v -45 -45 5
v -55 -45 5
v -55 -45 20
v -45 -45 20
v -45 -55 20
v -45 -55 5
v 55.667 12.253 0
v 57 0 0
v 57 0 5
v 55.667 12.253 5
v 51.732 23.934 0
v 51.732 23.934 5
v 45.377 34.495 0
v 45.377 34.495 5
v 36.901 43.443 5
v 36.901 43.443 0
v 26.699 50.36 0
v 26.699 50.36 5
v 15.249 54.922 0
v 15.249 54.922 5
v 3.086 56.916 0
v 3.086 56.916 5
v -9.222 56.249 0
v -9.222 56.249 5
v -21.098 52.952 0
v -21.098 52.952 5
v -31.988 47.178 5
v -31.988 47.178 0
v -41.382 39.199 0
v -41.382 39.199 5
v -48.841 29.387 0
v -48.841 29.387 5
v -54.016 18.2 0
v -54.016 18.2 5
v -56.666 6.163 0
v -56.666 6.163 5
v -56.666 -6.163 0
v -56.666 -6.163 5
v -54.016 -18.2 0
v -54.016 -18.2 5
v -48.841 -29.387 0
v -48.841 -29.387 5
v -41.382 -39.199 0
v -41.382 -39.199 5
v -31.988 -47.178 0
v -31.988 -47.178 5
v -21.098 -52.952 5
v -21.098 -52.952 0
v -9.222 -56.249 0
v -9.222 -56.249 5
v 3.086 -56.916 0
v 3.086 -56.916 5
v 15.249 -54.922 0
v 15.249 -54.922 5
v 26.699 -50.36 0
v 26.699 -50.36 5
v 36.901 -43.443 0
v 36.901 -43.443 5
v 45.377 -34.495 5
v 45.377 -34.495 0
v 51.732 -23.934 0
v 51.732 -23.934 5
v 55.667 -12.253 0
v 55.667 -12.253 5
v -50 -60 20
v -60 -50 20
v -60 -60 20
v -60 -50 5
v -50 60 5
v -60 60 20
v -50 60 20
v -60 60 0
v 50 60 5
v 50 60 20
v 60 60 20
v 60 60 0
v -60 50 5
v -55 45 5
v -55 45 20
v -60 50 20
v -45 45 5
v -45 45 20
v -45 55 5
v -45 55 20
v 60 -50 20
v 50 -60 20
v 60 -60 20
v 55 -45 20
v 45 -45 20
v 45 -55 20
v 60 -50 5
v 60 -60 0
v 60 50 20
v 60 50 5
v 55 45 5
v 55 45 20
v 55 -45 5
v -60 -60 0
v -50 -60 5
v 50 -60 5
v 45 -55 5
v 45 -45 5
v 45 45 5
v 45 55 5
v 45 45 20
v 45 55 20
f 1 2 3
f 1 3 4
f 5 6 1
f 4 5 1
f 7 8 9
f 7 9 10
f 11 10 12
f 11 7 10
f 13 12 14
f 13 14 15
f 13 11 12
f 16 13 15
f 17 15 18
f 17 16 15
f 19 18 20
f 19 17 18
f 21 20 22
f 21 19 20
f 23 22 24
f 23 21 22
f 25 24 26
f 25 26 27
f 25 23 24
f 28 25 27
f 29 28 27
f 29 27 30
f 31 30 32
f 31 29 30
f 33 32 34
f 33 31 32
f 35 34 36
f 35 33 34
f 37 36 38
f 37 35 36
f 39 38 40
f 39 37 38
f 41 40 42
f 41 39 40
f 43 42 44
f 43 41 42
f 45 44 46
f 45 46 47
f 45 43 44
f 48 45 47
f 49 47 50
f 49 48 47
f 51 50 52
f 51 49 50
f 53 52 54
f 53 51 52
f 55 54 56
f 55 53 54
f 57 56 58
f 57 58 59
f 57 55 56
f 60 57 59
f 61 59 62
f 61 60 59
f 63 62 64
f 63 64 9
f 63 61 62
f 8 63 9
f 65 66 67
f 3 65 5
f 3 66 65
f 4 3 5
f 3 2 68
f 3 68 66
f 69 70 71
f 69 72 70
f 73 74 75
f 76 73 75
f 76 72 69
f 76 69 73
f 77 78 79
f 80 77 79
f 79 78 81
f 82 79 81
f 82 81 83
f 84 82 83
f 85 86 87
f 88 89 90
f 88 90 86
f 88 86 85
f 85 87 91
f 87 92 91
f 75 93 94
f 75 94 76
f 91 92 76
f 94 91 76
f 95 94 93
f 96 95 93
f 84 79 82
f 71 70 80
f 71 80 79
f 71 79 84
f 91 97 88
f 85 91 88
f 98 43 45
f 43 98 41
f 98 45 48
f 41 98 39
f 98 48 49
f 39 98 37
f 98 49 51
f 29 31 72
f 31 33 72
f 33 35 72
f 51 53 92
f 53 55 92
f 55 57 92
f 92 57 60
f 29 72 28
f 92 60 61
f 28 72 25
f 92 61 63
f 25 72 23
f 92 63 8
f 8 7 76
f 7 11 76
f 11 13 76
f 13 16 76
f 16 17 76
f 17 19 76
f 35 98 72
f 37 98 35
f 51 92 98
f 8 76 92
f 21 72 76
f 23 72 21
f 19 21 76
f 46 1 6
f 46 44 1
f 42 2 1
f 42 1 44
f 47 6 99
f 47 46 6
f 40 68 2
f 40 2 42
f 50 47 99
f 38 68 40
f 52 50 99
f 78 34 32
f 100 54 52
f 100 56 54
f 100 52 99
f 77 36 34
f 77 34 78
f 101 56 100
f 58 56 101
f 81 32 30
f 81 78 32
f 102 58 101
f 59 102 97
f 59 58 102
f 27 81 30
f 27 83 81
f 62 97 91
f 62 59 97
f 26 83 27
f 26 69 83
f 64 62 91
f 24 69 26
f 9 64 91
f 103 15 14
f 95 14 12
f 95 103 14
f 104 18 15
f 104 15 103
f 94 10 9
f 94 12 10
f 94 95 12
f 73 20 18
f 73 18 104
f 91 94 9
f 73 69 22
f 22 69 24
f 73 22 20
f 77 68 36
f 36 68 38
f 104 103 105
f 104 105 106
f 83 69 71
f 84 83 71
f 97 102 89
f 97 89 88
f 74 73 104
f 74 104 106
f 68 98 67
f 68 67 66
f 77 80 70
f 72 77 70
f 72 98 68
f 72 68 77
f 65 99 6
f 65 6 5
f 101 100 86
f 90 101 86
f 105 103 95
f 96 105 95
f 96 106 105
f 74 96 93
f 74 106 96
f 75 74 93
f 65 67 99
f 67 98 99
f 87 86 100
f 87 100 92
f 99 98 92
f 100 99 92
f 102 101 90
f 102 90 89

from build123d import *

# Parameters (mm, degrees)
F0_R     = 57
F1_DEPTH = 5
F0_W     = 15
F0_H     = 15
F2_DEPTH = 20
F3_SIZE  = 5


with BuildPart() as f1:
    # F0 (on Top) → F1 (new body)
    with BuildSketch(Plane.XY):
        Polygon((-45, -60), (45, -60), (45, -45), (60, -45), (60, 45), (45, 45), (45, 60), (-45, 60), (-45, 45), (-60, 45), (-60, -45), (-45, -45), align=None)
        Circle(F0_R, mode=Mode.SUBTRACT)
    extrude(amount=F1_DEPTH)

    # F0 (on Top) → F2 (join)
    with BuildSketch(Plane.XY):
        with Locations((-52.5, 52.5)):
            Rectangle(F0_W, F0_H)
        with Locations((52.5, 52.5)):
            Rectangle(F0_W, F0_H)
        with Locations((52.5, -52.5)):
            Rectangle(F0_W, F0_H)
        with Locations((-52.5, -52.5)):
            Rectangle(F0_W, F0_H)
    extrude(amount=F2_DEPTH)

    # F3
    f3_edges = [f1.edges().sort_by_distance(p)[0] for p in [
        (-60, -45, 12.5),
        (-45, -60, 12.5),
        (45, -60, 12.5),
        (60, -45, 12.5),
        (45, 60, 12.5),
        (60, 45, 12.5),
        (-60, 45, 12.5),
        (-45, 60, 12.5),
    ]]
    chamfer(f3_edges, length=F3_SIZE)


solid = f1.part
